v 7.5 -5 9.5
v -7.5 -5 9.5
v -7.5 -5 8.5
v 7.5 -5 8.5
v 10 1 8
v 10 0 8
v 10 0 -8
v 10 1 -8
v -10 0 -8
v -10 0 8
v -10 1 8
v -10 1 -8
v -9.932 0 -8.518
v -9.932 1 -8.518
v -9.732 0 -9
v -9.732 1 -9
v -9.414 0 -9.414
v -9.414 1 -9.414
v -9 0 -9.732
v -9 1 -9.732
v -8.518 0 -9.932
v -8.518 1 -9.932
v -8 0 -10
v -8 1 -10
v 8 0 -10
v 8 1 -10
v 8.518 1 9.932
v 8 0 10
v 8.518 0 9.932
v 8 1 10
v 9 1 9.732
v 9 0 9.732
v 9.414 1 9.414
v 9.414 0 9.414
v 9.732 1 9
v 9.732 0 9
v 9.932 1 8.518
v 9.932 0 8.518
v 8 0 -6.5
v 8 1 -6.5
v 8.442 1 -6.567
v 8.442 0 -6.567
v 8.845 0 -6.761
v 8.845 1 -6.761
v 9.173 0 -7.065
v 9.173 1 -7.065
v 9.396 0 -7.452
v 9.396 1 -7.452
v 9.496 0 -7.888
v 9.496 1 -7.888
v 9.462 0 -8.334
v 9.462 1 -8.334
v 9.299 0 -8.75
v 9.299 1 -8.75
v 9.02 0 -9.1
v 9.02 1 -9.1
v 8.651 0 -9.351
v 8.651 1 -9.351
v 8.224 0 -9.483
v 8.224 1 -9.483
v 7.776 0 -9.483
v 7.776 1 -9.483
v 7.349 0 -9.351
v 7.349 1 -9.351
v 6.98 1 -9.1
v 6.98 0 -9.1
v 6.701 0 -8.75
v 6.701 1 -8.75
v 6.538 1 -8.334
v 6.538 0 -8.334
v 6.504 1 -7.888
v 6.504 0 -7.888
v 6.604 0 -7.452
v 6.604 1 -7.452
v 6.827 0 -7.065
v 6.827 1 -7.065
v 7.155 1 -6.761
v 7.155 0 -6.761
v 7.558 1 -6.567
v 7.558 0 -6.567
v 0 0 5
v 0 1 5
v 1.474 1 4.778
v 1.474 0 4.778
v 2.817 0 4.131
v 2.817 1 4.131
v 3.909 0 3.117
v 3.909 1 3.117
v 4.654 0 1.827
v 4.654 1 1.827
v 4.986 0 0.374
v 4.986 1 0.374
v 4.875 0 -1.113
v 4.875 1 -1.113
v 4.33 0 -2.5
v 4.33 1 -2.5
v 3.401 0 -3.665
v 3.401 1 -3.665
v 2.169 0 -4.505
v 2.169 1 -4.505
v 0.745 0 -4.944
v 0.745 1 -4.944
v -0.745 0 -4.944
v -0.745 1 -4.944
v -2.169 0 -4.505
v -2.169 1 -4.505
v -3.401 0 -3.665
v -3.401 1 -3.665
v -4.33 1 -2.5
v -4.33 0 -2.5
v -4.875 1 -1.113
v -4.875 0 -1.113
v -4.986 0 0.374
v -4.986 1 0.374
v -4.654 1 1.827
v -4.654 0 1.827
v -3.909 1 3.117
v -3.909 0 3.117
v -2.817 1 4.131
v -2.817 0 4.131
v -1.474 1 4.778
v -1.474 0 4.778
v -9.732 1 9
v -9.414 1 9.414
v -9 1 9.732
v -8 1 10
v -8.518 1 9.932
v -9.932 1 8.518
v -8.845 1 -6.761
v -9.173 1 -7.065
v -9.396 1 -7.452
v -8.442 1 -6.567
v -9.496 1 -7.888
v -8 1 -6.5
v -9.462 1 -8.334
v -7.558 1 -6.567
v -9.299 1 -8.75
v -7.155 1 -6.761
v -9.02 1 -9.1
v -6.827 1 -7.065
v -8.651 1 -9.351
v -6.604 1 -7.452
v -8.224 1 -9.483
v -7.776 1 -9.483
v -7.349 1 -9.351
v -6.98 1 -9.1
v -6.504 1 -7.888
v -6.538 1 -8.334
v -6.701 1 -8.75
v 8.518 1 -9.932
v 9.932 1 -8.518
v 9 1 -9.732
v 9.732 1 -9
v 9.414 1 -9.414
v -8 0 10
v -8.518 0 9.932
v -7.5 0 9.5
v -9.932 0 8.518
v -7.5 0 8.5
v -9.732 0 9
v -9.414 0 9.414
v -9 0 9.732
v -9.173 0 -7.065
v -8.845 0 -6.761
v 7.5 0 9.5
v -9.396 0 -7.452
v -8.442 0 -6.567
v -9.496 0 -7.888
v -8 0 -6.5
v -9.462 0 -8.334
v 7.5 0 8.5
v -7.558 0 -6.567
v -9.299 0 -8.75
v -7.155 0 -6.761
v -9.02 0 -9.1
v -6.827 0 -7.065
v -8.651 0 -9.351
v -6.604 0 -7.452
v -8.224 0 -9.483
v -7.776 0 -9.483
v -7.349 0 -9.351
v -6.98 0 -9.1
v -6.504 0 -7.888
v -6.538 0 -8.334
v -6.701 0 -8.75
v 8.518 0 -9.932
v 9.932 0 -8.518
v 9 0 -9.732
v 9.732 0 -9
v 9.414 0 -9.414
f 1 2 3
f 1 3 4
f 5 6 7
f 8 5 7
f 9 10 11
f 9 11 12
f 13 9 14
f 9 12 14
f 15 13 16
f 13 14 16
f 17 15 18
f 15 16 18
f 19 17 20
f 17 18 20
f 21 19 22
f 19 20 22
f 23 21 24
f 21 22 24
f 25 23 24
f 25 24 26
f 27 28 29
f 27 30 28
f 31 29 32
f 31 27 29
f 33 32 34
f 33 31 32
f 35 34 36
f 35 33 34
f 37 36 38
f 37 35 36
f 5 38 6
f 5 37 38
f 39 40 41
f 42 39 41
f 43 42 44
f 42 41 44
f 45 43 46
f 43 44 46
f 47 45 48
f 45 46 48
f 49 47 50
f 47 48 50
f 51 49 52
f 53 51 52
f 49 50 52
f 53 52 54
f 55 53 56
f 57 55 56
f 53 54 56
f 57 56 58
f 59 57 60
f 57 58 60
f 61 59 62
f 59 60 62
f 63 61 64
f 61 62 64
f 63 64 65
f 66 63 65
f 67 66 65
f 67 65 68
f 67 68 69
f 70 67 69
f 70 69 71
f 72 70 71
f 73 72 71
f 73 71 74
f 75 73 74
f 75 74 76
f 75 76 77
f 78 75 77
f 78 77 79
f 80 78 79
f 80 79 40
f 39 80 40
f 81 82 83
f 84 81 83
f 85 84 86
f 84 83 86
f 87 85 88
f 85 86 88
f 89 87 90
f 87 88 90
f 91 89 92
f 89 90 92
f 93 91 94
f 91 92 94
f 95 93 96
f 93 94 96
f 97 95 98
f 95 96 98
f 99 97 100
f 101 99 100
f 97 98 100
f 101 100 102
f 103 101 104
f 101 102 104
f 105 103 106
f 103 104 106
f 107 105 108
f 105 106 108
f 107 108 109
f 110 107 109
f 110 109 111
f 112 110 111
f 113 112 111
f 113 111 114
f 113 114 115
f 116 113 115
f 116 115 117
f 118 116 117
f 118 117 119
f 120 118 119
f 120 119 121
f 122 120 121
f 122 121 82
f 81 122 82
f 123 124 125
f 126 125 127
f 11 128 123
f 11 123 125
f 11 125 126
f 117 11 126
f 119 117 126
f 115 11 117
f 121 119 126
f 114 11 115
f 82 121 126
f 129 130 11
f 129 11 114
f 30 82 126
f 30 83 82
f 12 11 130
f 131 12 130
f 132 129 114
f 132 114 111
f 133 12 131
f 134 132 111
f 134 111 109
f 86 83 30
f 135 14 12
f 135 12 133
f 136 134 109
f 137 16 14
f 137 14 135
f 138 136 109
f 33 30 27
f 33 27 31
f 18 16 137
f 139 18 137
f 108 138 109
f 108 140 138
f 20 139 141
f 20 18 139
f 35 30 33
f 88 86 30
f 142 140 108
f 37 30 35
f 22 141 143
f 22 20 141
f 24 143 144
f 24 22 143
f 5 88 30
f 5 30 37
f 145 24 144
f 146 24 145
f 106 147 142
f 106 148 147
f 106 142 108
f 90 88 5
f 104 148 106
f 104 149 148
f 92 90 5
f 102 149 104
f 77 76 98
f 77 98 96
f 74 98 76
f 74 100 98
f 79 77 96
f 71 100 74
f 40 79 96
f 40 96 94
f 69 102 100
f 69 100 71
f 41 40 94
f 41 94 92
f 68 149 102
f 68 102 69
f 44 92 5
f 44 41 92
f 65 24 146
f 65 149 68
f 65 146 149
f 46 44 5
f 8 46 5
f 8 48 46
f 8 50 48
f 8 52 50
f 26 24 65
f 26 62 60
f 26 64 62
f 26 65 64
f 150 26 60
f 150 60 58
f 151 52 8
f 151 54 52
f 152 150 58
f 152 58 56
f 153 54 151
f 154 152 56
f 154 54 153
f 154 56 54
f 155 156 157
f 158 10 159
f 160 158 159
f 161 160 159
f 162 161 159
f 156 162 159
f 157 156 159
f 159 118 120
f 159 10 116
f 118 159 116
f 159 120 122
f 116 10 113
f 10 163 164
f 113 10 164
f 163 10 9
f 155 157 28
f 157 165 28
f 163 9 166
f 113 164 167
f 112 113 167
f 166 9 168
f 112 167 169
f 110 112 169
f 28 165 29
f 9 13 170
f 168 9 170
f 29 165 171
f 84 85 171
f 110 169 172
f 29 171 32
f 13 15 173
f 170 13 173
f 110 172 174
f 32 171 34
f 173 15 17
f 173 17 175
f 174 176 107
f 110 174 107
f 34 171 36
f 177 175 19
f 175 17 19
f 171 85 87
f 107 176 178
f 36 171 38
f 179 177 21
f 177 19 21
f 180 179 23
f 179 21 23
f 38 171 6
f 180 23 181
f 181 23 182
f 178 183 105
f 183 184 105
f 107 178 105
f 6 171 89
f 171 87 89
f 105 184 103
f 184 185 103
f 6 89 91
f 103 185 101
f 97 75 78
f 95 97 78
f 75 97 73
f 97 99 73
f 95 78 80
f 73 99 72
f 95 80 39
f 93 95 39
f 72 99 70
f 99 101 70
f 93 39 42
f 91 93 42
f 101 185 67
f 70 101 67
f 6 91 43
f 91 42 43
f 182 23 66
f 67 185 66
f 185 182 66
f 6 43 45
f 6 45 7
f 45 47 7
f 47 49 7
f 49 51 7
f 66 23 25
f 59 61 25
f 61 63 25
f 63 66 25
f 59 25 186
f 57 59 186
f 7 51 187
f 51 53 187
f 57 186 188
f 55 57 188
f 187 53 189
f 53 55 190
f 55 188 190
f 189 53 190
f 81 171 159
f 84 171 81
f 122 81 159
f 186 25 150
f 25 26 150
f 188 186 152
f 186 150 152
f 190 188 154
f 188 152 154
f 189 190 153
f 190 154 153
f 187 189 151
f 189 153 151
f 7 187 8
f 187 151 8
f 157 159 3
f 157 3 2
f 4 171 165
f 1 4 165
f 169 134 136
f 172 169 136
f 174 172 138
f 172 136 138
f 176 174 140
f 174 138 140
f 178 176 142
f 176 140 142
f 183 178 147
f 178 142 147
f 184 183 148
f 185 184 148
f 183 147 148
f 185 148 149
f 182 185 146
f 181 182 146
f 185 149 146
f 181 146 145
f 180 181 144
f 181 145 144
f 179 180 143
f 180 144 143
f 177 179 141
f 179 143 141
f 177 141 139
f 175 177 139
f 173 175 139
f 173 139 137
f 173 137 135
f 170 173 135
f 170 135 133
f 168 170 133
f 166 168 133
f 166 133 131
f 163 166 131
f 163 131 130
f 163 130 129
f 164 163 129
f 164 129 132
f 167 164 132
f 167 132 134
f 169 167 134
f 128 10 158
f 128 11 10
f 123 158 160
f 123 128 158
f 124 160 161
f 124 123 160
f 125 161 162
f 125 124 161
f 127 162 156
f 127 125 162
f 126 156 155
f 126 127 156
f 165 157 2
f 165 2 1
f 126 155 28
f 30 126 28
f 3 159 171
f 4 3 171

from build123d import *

# Parameters (mm, degrees)
SKETCH2_W           = 20
SKETCH2_H           = 20
BOSS_EXTRUDE1_DEPTH = 1
SKETCH3_R           = 5
SKETCH3_R_2         = 1.5
CUT_EXTRUDE1_DEPTH  = 15.177446879
FILLET1_R           = 2
SKETCH4_W           = 15
SKETCH4_H           = 1
BOSS_EXTRUDE2_DEPTH = 5


with BuildPart() as part:
    # Sketch2 → Boss-Extrude1 (new body)
    with BuildSketch(Plane(origin=(0, 0, 0), x_dir=(1, 0, 0), z_dir=(0, 1, 0))):
        Rectangle(SKETCH2_W, SKETCH2_H)
    extrude(amount=BOSS_EXTRUDE1_DEPTH)

    # Sketch3 → Cut-Extrude1 (cut, through all)
    with BuildSketch(Plane(origin=(0, 1, 0), x_dir=(1, 0, 0), z_dir=(0, 1, 0))):
        with Locations(Location((0, 0, 0), (0, 0, 270))):
            Circle(SKETCH3_R)
        with Locations(Location((-8, 8, 0), (0, 0, 270))):
            Circle(SKETCH3_R_2)
        with Locations(Location((8, 8, 0), (0, 0, 270))):
            Circle(SKETCH3_R_2)
    extrude(amount=-CUT_EXTRUDE1_DEPTH, mode=Mode.SUBTRACT)

    # Fillet1
    fillet1_edges = [part.edges().sort_by_distance(p)[0] for p in [
        (10, 0.5, 10),
        (-10, 0.5, 10),
        (-10, 0.5, -10),
        (10, 0.5, -10),
    ]]
    fillet(fillet1_edges, radius=FILLET1_R)

    # Sketch4 → Boss-Extrude2 (add)
    with BuildSketch(Plane.XZ):
        with Locations((0, 9)):
            Rectangle(SKETCH4_W, SKETCH4_H)
    extrude(amount=BOSS_EXTRUDE2_DEPTH)


solid = part.part
